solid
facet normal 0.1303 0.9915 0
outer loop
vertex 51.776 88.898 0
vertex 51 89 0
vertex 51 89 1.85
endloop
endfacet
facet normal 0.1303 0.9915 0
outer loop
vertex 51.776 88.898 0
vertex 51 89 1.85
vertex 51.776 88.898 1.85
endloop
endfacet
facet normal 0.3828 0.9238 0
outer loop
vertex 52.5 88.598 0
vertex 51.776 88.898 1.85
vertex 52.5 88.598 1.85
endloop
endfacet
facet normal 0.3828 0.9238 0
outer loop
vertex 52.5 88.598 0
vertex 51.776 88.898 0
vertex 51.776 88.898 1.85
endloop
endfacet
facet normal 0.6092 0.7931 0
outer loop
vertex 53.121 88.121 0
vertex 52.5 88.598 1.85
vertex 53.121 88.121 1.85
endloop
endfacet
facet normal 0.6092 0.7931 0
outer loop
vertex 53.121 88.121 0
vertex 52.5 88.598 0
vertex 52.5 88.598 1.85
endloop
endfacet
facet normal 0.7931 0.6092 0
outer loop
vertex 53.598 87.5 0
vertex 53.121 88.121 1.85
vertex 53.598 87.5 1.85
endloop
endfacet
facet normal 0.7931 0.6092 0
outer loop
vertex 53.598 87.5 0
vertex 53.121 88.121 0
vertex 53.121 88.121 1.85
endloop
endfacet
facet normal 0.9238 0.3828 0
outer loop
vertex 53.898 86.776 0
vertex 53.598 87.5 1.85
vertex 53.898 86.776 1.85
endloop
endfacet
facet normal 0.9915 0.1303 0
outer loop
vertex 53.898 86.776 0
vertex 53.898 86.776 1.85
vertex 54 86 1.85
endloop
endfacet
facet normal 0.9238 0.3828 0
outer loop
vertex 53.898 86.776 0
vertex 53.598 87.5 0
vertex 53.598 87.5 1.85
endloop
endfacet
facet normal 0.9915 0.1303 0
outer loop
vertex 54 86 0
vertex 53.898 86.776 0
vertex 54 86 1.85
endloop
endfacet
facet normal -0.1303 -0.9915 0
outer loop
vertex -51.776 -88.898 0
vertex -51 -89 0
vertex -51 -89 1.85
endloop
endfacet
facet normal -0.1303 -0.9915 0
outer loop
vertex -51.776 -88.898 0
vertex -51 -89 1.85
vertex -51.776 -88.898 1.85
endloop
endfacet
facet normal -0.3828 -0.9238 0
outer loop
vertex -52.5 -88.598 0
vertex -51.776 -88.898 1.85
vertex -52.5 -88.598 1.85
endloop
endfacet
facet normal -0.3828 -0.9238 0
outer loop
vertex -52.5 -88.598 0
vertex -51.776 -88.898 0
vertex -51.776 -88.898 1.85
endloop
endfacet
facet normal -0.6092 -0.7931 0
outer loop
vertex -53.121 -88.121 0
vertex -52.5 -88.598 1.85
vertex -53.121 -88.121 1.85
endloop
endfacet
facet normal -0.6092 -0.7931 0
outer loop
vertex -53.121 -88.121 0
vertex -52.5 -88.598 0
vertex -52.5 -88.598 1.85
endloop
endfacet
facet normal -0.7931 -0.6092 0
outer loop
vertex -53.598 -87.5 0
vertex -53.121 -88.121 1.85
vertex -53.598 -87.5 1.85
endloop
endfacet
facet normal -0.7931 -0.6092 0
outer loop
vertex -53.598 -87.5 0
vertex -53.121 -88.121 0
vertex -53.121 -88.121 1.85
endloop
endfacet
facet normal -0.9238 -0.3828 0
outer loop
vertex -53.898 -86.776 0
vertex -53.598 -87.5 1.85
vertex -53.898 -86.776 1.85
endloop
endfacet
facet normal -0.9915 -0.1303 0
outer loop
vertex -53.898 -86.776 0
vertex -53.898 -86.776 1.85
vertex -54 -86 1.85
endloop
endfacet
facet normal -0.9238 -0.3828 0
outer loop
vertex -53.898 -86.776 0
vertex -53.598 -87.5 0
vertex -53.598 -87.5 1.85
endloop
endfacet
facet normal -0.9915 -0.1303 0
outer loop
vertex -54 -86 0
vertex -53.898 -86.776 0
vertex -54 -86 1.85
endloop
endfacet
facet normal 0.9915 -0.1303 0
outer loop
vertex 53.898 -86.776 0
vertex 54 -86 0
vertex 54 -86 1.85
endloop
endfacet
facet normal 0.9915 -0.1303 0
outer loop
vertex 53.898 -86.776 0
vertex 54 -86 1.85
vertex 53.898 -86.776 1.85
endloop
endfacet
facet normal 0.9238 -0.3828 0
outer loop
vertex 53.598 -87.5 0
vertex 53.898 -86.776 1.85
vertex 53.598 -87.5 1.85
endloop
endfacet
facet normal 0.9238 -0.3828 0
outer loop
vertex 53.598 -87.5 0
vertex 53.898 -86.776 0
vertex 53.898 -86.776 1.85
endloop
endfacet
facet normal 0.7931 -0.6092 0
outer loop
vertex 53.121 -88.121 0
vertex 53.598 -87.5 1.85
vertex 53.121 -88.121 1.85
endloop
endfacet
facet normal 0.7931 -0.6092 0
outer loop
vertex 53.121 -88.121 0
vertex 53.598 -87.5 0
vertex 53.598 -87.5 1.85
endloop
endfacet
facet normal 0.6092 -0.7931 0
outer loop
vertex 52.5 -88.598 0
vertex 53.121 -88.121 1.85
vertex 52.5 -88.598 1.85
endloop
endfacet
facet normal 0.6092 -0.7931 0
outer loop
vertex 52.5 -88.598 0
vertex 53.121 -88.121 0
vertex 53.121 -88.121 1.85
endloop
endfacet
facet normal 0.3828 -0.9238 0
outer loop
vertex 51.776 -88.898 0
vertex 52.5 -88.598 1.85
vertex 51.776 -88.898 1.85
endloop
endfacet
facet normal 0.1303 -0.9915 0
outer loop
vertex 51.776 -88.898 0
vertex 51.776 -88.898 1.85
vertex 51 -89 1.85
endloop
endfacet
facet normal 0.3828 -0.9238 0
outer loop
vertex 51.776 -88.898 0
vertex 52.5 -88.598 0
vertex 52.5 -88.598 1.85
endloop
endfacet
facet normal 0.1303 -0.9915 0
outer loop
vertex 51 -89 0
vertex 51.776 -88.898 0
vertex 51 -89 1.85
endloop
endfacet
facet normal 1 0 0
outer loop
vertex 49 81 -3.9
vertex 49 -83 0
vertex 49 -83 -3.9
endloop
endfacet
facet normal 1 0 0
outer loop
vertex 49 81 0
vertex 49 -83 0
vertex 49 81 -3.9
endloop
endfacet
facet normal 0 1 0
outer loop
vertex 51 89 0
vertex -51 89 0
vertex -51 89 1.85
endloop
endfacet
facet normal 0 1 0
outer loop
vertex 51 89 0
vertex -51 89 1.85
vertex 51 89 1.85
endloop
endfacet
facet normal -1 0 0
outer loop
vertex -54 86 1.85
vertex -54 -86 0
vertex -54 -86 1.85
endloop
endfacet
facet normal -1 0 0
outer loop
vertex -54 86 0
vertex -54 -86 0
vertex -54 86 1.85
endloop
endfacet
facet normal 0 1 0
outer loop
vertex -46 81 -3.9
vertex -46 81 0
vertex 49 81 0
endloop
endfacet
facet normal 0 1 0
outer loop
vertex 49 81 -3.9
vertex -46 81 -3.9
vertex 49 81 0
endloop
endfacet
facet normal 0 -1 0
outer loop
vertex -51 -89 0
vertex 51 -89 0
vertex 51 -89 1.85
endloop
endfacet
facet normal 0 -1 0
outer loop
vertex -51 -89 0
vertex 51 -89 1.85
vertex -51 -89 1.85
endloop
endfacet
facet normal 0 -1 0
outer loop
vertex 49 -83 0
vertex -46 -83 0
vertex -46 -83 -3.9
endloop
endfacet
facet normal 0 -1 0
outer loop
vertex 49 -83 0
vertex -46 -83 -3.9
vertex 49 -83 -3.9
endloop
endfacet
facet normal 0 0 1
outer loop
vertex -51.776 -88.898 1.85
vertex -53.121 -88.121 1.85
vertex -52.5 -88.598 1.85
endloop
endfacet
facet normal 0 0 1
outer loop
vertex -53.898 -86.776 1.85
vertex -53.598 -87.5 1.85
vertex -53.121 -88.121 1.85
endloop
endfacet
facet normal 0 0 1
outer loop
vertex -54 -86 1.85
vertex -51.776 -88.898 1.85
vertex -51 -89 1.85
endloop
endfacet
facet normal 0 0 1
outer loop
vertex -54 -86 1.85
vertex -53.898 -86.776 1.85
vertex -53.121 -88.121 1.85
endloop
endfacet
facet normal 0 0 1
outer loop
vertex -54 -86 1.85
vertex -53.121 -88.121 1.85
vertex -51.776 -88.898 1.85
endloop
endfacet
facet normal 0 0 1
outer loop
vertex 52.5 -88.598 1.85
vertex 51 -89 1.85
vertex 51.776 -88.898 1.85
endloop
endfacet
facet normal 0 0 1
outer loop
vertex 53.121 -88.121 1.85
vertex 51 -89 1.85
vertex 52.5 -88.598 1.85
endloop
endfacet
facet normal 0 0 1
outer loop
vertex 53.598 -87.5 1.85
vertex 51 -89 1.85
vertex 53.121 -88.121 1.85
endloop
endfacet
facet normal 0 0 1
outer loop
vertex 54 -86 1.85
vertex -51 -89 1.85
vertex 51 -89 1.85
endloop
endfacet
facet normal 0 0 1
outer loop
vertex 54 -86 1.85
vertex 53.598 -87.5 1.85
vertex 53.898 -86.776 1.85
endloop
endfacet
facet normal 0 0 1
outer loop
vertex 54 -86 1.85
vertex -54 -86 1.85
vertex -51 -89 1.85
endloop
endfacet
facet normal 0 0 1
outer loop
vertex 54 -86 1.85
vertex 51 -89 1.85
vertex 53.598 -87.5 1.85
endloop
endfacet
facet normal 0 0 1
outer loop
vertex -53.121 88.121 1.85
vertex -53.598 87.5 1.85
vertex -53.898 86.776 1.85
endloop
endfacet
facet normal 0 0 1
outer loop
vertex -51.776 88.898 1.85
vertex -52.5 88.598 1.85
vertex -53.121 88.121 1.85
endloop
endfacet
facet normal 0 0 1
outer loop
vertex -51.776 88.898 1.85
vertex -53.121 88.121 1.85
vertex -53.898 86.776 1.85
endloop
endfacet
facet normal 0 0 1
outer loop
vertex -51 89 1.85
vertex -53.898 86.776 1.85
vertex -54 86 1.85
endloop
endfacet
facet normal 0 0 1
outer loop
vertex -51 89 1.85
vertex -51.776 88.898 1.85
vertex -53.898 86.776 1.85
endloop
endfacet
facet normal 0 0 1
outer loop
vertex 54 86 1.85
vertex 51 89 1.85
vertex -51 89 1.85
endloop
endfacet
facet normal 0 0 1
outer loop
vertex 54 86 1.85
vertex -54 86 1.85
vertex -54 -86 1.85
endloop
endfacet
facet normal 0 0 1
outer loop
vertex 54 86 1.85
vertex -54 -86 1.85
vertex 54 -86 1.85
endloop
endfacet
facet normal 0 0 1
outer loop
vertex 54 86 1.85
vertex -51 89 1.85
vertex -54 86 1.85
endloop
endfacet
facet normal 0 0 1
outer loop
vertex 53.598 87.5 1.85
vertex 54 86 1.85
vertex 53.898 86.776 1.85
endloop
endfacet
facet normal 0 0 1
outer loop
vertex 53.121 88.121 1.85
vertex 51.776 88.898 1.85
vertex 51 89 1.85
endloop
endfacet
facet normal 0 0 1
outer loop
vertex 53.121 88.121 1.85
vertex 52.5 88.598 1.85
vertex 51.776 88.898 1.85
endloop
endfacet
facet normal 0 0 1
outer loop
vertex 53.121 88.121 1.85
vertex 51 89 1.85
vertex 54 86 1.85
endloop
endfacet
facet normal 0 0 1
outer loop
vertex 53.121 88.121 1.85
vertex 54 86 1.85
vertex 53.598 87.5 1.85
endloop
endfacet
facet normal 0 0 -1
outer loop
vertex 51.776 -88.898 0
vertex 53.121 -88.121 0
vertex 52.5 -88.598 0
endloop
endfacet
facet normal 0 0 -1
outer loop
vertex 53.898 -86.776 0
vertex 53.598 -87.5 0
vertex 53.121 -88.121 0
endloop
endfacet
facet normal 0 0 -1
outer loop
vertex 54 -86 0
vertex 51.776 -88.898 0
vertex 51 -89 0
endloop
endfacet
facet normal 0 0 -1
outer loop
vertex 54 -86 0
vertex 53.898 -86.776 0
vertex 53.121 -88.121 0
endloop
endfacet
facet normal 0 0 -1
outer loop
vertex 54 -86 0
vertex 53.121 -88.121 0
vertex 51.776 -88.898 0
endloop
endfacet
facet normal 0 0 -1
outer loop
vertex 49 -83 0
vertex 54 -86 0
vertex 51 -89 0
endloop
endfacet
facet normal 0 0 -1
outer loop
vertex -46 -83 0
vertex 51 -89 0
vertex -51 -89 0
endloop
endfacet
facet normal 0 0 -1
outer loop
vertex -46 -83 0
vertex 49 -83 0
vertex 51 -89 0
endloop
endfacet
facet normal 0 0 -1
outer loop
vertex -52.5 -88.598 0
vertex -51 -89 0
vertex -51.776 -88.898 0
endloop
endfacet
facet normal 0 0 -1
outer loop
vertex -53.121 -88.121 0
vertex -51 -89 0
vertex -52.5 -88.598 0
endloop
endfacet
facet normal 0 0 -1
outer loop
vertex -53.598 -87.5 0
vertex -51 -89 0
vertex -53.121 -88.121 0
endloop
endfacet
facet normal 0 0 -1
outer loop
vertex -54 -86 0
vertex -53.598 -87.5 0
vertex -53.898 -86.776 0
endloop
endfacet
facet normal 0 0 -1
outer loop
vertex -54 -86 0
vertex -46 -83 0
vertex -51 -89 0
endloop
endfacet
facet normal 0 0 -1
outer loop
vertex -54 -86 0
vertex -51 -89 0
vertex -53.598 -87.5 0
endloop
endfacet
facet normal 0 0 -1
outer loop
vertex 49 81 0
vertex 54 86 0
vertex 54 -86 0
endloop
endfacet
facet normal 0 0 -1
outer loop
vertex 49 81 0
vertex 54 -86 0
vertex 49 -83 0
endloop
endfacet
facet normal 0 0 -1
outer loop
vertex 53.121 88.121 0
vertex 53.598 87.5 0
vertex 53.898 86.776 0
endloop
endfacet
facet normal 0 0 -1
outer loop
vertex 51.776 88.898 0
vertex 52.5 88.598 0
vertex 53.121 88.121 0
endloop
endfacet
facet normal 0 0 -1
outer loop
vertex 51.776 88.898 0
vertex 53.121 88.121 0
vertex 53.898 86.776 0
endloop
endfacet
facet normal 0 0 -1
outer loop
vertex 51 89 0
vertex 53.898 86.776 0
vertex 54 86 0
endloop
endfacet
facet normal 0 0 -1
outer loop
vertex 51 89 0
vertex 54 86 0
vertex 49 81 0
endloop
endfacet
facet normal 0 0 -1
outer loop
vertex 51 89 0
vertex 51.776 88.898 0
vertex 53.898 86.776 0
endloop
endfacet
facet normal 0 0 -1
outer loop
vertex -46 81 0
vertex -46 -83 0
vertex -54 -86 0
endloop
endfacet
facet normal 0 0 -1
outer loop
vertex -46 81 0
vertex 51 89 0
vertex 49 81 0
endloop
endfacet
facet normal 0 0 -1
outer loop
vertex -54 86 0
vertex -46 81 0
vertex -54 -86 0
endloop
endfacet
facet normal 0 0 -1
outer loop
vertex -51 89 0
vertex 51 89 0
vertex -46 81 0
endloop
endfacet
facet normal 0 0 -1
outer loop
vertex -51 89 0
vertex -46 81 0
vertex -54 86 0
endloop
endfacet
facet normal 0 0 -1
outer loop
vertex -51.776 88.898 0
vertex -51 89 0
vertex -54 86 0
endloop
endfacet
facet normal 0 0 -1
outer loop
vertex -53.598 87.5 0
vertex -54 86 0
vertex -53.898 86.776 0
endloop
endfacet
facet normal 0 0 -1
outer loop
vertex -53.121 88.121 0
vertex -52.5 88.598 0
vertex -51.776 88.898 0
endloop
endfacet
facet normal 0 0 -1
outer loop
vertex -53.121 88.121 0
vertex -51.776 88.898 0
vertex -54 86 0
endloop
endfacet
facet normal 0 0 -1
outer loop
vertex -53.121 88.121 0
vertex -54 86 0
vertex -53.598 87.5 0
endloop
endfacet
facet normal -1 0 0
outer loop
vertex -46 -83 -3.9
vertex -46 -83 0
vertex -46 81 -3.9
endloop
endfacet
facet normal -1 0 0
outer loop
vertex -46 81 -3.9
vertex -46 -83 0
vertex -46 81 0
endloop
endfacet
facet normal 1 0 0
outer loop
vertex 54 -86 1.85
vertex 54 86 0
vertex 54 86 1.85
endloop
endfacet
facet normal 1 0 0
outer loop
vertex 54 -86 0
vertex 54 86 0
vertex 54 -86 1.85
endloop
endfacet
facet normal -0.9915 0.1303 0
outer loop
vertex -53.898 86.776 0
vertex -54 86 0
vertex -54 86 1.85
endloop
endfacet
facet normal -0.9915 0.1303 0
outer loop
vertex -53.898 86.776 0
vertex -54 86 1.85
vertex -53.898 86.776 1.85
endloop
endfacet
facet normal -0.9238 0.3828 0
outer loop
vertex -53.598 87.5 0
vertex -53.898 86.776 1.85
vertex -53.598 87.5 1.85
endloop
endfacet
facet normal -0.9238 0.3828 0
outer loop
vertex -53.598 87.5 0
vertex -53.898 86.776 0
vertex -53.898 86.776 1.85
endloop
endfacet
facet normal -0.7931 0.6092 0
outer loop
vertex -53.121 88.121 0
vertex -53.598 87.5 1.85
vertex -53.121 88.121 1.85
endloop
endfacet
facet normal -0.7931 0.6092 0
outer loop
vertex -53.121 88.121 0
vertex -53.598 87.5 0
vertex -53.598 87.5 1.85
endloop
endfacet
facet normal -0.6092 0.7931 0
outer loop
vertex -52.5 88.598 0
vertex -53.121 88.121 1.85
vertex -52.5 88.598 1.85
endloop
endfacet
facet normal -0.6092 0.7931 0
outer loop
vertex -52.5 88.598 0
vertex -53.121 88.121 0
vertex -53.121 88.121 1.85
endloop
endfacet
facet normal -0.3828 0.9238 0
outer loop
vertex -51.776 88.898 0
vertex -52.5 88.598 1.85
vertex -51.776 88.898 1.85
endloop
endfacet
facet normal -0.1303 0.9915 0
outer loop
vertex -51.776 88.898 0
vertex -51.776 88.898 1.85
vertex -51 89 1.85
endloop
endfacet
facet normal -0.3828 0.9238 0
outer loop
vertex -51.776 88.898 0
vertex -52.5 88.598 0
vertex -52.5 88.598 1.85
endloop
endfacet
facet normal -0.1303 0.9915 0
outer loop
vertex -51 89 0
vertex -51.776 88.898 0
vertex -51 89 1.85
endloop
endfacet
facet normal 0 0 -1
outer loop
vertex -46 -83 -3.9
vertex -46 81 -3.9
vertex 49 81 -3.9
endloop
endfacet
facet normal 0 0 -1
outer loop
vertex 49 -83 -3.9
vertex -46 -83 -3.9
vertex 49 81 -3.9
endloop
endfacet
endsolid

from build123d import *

# Parameters (mm, degrees)
BOSS_EXTRUDE1_DEPTH = 1.85
SKETCH2_W           = 95
SKETCH2_H           = 164
BOSS_EXTRUDE2_DEPTH = 5.75


with BuildPart() as part:
    # Sketch1 → Boss-Extrude1 (new body)
    with BuildSketch(Plane.XY):
        with BuildLine():
            Line((-51, 89), (51, 89))
            ThreePointArc((51, 89), (53.121320344, 88.121320344), (54, 86))
            Line((54, 86), (54, -86))
            ThreePointArc((54, -86), (53.121320344, -88.121320344), (51, -89))
            Line((51, -89), (-51, -89))
            ThreePointArc((-51, -89), (-53.121320344, -88.121320344), (-54, -86))
            Line((-54, -86), (-54, 86))
            ThreePointArc((-54, 86), (-53.121320344, 88.121320344), (-51, 89))
        make_face()
    extrude(amount=BOSS_EXTRUDE1_DEPTH)

    # Sketch2 → Boss-Extrude2 (add)
    with BuildSketch(Plane.XY.offset(1.85)):
        with Locations((1.5, -1)):
            Rectangle(SKETCH2_W, SKETCH2_H)
    extrude(amount=-BOSS_EXTRUDE2_DEPTH)


solid = part.part
